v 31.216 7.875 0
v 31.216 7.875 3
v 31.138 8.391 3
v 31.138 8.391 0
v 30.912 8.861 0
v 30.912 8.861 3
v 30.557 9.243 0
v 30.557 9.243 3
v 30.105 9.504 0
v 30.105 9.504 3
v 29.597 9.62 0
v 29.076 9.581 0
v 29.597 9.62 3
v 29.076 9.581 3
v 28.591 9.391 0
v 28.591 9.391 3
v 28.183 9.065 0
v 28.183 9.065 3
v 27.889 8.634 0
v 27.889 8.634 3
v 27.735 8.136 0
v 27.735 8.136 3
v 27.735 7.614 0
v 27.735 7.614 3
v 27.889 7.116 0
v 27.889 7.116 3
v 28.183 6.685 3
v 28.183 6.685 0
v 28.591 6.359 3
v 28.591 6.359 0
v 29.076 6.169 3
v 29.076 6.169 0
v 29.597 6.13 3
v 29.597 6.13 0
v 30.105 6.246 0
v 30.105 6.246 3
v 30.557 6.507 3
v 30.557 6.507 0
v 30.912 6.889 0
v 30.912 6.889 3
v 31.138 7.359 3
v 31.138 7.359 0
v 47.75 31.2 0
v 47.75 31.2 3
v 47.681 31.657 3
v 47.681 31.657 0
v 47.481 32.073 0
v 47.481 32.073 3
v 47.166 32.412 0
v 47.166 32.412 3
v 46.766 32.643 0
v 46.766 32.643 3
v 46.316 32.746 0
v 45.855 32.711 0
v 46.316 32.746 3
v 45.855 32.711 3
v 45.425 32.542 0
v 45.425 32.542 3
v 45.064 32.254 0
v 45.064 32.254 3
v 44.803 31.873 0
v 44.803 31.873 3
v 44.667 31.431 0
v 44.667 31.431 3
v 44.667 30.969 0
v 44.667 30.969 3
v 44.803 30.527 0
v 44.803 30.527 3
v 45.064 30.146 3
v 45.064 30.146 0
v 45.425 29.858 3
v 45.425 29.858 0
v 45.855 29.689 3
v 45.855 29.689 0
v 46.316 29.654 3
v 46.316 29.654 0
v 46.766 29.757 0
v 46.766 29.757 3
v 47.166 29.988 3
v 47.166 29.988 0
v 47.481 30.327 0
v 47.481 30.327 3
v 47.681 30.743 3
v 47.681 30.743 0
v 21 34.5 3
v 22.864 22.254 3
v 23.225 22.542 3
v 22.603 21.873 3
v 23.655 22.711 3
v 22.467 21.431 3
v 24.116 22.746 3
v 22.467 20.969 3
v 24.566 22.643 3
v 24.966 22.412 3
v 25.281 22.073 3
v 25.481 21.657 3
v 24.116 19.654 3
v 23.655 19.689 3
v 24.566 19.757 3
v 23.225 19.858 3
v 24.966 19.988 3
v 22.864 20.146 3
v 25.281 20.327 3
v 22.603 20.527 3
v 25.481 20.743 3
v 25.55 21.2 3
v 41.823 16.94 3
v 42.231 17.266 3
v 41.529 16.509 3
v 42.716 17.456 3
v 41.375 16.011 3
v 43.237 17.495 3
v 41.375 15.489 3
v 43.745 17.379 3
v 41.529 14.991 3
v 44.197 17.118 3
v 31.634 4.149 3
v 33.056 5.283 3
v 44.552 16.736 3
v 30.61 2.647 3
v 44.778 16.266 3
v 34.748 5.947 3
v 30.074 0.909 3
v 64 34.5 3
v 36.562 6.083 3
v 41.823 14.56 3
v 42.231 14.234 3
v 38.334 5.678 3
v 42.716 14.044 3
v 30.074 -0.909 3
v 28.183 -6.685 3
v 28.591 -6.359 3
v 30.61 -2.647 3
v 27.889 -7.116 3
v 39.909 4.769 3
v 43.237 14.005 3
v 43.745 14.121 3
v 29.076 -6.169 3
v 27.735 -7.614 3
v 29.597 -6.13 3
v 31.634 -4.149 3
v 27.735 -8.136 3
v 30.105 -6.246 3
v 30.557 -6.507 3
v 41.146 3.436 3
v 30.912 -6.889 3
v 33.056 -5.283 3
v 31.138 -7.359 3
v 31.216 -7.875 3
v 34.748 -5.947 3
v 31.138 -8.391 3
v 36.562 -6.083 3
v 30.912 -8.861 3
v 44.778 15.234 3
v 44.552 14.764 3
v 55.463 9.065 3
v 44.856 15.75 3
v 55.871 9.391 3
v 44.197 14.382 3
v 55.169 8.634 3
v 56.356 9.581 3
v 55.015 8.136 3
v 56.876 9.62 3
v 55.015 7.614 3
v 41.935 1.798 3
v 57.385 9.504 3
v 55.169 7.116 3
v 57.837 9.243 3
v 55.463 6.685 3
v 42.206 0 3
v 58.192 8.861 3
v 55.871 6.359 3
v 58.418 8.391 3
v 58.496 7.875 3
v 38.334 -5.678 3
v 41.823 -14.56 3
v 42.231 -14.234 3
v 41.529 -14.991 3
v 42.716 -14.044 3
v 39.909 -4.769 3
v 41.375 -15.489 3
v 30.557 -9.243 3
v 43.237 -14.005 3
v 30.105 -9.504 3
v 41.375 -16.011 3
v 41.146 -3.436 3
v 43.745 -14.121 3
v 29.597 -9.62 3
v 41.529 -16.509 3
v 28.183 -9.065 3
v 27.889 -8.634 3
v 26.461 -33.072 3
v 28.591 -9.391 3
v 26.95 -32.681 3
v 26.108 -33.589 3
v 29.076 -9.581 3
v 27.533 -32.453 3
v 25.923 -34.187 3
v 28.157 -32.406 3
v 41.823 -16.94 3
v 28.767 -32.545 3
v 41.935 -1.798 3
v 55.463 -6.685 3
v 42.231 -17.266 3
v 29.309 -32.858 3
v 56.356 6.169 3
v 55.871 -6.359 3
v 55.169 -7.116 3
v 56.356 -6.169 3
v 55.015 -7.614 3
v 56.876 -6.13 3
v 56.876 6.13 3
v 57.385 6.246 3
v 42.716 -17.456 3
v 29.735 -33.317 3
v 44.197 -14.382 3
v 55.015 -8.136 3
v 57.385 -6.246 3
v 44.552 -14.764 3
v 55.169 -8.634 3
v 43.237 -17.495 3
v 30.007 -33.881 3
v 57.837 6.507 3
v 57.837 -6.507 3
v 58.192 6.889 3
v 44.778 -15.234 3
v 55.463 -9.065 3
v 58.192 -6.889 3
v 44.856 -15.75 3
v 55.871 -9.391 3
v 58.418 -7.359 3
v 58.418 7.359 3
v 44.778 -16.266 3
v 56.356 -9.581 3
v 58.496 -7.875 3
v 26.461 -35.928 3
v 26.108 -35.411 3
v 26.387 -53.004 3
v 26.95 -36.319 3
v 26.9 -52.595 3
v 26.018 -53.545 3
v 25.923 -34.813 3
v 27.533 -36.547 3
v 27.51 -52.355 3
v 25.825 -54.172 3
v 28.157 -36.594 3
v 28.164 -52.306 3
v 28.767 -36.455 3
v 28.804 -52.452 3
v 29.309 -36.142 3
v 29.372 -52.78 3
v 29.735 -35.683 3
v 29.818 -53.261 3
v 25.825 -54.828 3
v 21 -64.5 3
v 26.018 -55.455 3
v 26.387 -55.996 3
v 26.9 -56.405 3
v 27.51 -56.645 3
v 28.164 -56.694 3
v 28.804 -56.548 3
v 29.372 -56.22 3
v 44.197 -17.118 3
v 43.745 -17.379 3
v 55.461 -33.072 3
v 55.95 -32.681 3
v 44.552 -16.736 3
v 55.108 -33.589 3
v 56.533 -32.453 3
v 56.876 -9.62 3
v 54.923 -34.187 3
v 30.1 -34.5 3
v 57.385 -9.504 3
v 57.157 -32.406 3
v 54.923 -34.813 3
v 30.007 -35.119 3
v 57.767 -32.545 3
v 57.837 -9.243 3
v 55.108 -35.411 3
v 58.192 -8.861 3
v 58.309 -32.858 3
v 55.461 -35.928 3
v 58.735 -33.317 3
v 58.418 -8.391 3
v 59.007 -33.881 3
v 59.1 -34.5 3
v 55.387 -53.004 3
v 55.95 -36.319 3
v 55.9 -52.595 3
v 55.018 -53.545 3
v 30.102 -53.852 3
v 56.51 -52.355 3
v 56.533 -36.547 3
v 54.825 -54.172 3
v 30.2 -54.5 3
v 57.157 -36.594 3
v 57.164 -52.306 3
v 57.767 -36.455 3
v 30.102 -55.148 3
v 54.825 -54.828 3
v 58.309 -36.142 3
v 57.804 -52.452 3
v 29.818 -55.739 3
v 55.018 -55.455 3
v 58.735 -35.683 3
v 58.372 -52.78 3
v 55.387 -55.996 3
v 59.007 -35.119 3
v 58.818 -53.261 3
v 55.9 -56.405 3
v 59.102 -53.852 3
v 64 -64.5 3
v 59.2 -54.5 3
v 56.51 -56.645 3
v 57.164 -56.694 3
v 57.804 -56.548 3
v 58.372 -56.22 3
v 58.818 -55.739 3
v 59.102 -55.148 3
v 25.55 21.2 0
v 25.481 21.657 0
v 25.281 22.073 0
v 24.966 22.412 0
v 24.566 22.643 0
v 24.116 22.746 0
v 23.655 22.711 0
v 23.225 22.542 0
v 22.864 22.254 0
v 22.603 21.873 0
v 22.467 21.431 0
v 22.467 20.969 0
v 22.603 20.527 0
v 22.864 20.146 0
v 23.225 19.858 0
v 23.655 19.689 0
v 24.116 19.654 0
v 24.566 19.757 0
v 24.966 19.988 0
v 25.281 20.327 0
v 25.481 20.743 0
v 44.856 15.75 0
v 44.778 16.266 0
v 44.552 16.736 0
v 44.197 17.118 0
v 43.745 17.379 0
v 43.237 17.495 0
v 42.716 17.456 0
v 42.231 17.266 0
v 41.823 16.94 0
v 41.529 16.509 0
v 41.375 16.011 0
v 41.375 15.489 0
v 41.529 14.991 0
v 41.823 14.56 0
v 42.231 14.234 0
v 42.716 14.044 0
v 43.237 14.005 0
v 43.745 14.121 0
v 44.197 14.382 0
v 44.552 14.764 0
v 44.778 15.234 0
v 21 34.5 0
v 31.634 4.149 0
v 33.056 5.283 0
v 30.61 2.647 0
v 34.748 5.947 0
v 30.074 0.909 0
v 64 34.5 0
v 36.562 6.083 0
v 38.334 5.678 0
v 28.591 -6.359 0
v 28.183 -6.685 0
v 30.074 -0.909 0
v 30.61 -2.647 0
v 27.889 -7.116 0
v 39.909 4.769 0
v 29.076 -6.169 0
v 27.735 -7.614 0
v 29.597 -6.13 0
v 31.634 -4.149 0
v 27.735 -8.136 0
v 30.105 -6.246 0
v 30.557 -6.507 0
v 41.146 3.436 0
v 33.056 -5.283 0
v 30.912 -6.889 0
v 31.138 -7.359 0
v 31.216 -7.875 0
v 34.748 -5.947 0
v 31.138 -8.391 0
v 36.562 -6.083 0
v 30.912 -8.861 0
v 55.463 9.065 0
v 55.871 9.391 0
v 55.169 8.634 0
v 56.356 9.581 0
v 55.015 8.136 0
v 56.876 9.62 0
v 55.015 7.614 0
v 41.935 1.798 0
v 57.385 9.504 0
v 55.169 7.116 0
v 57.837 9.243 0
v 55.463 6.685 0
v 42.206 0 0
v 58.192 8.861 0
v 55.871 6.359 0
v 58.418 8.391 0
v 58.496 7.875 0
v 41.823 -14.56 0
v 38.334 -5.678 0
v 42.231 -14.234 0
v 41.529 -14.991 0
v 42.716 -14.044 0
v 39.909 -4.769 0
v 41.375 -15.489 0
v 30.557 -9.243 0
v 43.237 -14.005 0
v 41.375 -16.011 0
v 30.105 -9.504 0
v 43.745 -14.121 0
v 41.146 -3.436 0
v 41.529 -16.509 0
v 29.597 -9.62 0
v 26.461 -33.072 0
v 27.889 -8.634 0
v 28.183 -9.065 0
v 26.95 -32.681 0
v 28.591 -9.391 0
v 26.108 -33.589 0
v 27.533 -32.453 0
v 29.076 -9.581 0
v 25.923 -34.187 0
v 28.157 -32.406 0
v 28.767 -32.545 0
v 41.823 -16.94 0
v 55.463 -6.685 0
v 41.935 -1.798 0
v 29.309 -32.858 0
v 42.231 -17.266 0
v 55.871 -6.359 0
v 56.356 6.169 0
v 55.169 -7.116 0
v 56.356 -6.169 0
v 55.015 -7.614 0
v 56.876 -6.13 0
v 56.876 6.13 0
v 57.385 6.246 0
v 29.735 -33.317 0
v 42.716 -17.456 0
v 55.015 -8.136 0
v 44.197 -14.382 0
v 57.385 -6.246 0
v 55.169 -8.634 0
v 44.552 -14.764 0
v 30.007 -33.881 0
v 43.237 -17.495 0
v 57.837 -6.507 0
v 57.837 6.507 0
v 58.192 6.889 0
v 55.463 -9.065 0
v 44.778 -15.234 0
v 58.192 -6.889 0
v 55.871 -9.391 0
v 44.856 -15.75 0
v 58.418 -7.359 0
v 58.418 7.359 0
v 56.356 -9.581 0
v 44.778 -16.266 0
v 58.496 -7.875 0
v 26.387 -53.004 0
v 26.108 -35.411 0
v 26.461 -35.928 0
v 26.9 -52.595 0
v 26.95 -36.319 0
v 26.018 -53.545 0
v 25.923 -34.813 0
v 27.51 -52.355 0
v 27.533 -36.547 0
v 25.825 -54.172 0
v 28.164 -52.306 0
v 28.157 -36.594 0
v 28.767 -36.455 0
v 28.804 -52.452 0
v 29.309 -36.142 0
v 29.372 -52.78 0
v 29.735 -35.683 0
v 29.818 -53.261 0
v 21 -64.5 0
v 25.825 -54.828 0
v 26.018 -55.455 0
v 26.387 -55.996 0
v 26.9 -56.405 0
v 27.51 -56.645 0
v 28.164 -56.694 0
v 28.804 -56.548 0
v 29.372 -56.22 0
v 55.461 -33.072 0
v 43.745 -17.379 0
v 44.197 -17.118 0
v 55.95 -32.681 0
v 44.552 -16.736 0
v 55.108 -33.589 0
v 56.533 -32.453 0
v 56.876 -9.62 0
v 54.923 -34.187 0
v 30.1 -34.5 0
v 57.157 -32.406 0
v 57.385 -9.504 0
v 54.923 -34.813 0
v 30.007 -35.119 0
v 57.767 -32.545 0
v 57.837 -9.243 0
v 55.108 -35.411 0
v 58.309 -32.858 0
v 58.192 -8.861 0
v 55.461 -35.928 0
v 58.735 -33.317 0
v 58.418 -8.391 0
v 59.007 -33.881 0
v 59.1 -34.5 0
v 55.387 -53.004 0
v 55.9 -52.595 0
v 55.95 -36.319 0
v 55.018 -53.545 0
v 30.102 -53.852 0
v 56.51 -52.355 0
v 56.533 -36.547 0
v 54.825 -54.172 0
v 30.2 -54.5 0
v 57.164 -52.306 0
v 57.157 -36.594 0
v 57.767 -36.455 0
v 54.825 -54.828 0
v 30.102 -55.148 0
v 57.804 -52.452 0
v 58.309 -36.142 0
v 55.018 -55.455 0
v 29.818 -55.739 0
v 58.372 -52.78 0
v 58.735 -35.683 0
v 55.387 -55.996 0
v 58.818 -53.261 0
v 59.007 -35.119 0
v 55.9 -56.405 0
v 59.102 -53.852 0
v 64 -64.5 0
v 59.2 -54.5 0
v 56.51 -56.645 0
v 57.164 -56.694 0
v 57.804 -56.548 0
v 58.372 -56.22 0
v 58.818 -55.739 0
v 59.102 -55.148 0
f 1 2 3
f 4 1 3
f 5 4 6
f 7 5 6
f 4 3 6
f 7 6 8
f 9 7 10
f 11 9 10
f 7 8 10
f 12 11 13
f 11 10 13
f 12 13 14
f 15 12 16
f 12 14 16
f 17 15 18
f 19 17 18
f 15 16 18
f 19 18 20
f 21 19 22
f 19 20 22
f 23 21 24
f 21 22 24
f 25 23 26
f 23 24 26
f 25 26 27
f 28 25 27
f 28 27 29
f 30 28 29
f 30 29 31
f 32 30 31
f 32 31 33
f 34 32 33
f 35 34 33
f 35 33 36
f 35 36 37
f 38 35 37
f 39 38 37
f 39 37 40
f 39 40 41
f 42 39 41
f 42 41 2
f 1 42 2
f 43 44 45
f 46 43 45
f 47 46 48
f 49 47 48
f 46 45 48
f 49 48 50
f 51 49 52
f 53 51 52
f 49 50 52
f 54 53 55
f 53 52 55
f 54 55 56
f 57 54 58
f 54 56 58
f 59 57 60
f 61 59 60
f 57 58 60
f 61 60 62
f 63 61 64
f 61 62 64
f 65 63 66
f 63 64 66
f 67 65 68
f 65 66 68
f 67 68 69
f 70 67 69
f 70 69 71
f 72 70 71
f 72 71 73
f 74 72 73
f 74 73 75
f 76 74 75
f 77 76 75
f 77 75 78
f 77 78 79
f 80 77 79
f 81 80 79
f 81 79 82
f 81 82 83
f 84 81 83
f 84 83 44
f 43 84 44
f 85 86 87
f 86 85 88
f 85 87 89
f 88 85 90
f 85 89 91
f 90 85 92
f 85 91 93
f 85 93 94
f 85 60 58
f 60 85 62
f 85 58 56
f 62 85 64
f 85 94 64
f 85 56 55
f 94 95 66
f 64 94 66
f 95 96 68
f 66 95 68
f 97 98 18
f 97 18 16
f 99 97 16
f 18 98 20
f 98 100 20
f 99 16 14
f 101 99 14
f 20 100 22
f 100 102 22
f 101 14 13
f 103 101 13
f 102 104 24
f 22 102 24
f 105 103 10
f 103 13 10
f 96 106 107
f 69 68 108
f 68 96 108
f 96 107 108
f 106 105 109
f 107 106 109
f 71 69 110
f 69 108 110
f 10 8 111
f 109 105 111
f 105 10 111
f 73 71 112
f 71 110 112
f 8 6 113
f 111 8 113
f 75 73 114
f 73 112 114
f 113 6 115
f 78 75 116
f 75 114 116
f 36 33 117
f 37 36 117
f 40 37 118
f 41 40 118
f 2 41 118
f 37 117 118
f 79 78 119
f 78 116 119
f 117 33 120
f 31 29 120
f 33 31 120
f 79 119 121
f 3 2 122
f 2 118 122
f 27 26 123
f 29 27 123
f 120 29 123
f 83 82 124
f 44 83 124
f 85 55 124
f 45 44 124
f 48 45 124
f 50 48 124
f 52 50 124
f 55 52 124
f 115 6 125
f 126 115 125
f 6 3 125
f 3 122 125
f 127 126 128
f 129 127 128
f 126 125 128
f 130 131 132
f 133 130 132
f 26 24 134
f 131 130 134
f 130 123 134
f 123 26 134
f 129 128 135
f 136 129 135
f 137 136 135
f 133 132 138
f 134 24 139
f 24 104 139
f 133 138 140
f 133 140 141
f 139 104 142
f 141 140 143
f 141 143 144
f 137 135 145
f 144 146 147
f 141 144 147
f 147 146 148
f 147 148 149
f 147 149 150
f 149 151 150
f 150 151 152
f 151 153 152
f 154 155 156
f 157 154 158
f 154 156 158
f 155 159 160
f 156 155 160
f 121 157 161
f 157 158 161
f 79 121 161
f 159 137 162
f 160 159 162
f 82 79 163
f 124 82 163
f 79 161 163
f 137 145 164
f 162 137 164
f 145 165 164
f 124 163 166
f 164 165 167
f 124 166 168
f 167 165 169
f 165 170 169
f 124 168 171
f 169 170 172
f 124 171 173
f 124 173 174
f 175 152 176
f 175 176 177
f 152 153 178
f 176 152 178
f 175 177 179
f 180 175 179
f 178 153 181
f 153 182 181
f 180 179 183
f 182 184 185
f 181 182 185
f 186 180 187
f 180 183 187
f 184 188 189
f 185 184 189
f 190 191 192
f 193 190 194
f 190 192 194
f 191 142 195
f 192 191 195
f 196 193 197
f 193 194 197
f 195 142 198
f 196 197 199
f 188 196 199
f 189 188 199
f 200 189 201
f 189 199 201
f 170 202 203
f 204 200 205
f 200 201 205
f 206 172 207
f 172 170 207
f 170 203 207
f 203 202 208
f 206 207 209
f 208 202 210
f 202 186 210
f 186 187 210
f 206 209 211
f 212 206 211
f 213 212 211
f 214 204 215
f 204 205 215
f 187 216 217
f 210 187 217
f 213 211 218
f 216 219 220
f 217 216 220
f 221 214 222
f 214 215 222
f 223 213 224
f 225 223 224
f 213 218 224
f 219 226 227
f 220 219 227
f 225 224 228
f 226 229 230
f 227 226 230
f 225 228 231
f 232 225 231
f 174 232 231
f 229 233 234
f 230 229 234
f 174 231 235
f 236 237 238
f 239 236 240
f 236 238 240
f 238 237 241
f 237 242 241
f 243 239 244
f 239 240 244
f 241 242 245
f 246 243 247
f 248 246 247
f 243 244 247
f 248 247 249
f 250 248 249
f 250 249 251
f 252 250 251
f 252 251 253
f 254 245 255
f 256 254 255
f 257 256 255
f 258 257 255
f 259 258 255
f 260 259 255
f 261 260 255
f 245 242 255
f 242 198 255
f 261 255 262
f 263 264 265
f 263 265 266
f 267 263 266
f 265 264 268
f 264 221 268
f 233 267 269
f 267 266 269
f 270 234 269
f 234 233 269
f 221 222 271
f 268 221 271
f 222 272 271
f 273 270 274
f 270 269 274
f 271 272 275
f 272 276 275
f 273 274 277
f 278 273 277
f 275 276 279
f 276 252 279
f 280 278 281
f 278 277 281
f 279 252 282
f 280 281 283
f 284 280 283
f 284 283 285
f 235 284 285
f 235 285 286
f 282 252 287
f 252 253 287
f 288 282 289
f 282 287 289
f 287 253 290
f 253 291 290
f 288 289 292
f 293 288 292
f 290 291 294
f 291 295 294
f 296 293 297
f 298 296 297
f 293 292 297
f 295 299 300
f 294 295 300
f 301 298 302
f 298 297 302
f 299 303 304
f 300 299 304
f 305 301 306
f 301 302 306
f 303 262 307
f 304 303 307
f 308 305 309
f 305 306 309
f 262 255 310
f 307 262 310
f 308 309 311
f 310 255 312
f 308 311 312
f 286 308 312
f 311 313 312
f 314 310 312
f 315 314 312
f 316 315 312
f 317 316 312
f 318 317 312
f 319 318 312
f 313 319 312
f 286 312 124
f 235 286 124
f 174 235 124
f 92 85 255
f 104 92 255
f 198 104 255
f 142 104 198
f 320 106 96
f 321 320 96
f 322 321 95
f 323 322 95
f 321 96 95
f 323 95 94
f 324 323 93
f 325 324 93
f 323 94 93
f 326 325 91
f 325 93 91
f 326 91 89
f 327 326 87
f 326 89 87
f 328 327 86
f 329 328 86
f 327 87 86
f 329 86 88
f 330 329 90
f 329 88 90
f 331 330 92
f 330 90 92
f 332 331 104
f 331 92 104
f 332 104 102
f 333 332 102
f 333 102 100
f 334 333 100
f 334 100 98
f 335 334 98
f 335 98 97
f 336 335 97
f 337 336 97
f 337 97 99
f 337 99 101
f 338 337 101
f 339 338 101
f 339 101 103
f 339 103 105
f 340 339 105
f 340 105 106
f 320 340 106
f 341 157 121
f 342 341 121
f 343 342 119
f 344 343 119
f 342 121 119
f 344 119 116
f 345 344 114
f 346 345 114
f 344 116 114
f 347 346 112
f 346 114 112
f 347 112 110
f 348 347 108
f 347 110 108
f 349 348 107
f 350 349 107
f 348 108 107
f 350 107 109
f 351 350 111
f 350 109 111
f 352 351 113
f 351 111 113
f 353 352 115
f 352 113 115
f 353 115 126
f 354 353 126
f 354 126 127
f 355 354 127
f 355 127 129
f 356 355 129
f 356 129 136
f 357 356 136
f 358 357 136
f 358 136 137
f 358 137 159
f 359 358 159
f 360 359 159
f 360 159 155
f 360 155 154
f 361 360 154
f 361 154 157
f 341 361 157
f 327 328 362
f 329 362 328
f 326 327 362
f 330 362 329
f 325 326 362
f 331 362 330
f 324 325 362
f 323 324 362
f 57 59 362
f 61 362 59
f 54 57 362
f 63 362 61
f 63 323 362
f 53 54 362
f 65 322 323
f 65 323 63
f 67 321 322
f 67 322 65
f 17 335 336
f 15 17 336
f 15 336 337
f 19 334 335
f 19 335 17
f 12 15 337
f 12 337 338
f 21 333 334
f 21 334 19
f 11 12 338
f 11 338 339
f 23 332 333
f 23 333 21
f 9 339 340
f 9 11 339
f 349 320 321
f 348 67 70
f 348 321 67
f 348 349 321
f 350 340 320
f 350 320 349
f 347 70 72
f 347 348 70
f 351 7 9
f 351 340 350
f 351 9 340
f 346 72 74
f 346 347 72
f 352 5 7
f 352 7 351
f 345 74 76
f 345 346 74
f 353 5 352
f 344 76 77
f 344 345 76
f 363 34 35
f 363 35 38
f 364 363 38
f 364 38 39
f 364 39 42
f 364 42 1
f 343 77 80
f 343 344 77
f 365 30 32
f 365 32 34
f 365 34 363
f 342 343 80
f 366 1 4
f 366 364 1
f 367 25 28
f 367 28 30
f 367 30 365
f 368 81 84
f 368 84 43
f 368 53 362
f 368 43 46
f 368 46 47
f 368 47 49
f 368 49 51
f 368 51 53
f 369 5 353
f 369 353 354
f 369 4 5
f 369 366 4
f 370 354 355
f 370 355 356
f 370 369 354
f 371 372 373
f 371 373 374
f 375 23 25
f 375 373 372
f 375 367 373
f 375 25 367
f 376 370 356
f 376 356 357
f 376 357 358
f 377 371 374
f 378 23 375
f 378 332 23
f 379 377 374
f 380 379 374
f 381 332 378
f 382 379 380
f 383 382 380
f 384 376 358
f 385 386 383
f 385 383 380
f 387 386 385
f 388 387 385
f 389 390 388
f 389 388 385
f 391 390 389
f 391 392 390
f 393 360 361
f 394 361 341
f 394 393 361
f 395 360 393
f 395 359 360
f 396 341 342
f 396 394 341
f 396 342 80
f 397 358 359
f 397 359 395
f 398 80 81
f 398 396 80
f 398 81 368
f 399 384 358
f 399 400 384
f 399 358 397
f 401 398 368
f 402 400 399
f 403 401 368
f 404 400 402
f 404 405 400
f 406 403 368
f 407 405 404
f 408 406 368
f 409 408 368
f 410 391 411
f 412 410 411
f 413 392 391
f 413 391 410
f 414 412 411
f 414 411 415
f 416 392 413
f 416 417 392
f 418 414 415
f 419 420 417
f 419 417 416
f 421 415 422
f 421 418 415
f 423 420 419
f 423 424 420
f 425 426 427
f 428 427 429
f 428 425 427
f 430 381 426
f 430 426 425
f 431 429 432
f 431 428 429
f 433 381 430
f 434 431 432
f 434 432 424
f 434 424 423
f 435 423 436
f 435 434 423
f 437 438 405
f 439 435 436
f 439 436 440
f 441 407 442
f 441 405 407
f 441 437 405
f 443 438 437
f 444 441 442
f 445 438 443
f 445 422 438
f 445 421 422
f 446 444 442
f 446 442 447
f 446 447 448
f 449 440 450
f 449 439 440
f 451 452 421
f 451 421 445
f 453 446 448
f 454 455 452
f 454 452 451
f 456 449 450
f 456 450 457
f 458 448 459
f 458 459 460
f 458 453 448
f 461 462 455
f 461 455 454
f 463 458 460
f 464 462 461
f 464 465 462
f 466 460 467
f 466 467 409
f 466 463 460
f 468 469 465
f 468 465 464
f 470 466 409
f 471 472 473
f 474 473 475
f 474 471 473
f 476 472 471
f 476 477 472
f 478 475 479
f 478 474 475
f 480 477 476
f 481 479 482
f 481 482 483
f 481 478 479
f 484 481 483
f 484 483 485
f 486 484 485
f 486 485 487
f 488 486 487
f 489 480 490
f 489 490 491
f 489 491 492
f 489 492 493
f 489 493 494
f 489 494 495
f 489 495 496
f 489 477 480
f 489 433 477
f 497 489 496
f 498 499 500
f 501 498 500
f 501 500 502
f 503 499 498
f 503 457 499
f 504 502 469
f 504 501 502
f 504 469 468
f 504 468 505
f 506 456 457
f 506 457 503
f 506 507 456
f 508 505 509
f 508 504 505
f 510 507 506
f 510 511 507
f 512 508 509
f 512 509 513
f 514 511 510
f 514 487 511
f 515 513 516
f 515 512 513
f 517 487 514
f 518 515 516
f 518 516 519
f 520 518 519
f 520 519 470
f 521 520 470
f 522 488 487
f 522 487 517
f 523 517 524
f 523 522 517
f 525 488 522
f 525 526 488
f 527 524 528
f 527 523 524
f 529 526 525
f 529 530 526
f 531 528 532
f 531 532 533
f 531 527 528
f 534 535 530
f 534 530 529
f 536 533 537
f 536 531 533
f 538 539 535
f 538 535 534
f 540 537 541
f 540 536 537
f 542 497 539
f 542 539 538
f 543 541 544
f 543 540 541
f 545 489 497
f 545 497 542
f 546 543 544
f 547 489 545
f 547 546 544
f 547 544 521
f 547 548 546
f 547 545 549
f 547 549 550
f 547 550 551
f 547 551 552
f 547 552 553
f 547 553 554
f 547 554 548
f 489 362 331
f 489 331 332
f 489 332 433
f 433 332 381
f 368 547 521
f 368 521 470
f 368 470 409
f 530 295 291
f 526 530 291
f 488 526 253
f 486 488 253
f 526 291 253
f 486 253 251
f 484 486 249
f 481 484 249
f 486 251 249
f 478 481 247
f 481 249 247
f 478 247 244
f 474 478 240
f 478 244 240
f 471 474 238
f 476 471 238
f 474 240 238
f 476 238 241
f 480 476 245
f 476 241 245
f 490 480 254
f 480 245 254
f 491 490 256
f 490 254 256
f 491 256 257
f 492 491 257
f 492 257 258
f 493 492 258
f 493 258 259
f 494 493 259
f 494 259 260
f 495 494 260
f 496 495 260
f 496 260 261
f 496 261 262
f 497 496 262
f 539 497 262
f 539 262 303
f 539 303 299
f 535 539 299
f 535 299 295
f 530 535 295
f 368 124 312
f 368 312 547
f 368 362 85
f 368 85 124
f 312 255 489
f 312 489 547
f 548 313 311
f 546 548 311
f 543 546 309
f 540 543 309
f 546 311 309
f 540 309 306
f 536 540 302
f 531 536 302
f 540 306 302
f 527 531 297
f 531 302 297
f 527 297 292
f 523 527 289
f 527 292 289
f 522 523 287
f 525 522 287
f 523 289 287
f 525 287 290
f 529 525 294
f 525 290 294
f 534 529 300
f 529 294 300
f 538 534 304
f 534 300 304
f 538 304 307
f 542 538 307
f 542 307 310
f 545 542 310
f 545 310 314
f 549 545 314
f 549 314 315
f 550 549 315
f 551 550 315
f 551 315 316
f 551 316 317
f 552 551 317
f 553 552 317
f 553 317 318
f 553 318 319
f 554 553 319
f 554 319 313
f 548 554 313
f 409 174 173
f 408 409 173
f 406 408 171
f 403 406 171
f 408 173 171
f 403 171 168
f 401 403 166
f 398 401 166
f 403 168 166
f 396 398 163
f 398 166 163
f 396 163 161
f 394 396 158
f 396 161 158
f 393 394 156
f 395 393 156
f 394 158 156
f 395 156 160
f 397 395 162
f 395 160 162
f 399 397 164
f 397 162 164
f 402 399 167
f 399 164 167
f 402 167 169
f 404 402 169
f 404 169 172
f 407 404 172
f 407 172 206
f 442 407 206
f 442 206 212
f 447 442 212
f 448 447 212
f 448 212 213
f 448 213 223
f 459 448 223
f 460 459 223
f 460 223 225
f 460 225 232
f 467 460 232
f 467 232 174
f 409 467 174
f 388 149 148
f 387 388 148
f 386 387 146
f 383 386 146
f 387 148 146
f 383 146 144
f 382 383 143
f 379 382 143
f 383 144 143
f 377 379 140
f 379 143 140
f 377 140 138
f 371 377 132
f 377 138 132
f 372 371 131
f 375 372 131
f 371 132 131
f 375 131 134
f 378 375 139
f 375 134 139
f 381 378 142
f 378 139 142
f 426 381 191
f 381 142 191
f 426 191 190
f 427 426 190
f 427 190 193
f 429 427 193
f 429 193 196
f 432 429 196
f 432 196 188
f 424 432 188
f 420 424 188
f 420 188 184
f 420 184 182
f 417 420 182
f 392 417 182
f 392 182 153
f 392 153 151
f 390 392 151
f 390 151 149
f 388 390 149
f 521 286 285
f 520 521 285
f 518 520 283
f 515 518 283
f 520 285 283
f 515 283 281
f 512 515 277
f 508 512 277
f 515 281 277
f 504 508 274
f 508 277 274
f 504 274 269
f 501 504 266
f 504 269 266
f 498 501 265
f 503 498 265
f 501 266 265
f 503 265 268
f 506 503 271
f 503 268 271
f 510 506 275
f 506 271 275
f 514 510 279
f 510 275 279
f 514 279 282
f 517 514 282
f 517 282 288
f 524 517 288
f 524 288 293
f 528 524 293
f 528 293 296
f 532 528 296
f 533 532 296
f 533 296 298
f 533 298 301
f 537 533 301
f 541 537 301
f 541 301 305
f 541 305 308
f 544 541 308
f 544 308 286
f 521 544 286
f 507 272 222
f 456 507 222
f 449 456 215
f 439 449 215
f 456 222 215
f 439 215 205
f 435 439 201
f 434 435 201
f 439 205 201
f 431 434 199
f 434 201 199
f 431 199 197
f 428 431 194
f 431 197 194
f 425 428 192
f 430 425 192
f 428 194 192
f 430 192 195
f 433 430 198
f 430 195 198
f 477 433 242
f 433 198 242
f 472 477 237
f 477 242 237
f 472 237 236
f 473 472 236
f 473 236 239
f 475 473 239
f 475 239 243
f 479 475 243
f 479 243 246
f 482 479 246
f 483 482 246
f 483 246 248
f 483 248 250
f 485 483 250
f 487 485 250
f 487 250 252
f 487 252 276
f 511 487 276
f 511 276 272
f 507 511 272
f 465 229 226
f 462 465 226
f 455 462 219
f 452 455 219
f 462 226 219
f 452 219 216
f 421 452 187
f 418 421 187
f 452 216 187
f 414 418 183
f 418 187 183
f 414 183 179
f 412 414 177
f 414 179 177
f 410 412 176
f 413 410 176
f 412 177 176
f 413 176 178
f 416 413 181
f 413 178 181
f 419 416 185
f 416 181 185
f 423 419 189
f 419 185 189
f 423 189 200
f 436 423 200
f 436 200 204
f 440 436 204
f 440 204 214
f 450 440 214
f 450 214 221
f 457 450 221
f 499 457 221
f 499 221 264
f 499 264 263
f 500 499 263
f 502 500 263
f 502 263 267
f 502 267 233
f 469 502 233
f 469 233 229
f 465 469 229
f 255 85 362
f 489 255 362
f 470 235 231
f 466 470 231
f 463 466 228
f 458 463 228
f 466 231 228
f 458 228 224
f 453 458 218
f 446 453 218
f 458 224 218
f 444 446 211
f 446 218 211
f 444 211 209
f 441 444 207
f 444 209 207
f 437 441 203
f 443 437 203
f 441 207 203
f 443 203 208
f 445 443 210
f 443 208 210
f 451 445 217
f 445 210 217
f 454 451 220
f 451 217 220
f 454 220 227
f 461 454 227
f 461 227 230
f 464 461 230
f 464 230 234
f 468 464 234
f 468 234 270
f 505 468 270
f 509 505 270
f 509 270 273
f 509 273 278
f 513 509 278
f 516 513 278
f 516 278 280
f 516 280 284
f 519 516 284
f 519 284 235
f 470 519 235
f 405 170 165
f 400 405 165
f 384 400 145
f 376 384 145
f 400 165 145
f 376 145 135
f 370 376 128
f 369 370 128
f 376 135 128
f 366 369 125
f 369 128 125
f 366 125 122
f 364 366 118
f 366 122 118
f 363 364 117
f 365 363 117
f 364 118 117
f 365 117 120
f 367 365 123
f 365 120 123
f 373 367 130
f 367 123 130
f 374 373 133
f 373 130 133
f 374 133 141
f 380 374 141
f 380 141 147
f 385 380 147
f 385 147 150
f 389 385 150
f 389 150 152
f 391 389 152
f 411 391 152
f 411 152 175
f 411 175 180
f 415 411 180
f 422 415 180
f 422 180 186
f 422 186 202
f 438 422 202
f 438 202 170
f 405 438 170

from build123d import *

# Parameters (mm, degrees)
SKETCH_1_W          = 40
SKETCH_1_H          = 29
EXTRUDE_1_DEPTH     = 3
CUT_EXTRUDE_1_DEPTH = 3
SKETCH_3_W          = 40
SKETCH_3_H          = 3
EXTRUDE_2_DEPTH     = 10
SKETCH_4_W          = 40
SKETCH_4_H          = 3
EXTRUDE_3_DEPTH     = 10
SKETCH_6_W          = 3
SKETCH_6_H          = 49
EXTRUDE_5_DEPTH     = 42
SKETCH_8_W          = 3
SKETCH_8_H          = 49
EXTRUDE_6_DEPTH     = 2
SKETCH_9_W          = 3
SKETCH_9_H          = 49
EXTRUDE_7_DEPTH     = 2
SKETCH_10_W         = 86
SKETCH_10_H         = 3
EXTRUDE_8_DEPTH     = 10
SKETCH_11_W         = 86
SKETCH_11_H         = 3
EXTRUDE_9_DEPTH     = 10
SKETCH_7_R          = 1.75
SKETCH_7_R_2        = 6.1
CUT_EXTRUDE_4_DEPTH = 10
SKETCH_14_W         = 3
SKETCH_14_H         = 69
CUT_EXTRUDE_5_DEPTH = 43
SKETCH_17_W         = 43
SKETCH_17_H         = 3
EXTRUDE_10_DEPTH    = 20
SKETCH_18_R         = 2.1
CUT_EXTRUDE_6_DEPTH = 10
SKETCH_20_W         = 43
SKETCH_20_H         = 3
EXTRUDE_11_DEPTH    = 10
SKETCH_21_W         = 43
SKETCH_21_H         = 3
CUT_EXTRUDE_7_DEPTH = 10
SKETCH_22_R         = 2.2
CUT_EXTRUDE_8_DEPTH = 10
SKETCH_24_W         = 43
SKETCH_24_H         = 3
EXTRUDE_12_DEPTH    = 10
SKETCH_25_R         = 1.55
CUT_EXTRUDE_9_DEPTH = 10


with BuildPart() as part:
    # ｽｹｯﾁ1 → ﾎﾞｽ - 押し出し1 (new body)
    with BuildSketch(Plane.XY):
        Rectangle(SKETCH_1_W, SKETCH_1_H)
    extrude(amount=EXTRUDE_1_DEPTH)

    # ｽｹｯﾁ2 → ｶｯﾄ - 押し出し1 (cut)
    with BuildSketch(Plane.XY.offset(3)):
        with BuildLine():
            ThreePointArc((-14.4, 10.5), (-15.01507576, 11.98492424), (-16.5, 12.6))
            Line((-16.5, 12.6), (-16.5, 10.5))
            Line((-16.5, 10.5), (-18.6, 10.5))
            ThreePointArc((-18.6, 10.5), (-16.5, 8.4), (-14.4, 10.5))
        make_face()
        with BuildLine():
            Line((-16.5, 10.5), (-16.5, 12.6))
            ThreePointArc((-16.5, 12.6), (-17.98492424, 11.98492424), (-18.6, 10.5))
            Line((-18.6, 10.5), (-16.5, 10.5))
        make_face()
        with BuildLine():
            ThreePointArc((-18.6, -10.5), (-17.98492424, -11.98492424), (-16.5, -12.6))
            Line((-16.5, -12.6), (-16.5, -10.5))
            Line((-16.5, -10.5), (-18.6, -10.5))
        make_face()
        with BuildLine():
            Line((-16.5, -10.5), (-16.5, -12.6))
            ThreePointArc((-16.5, -12.6), (-15.01507576, -11.98492424), (-14.4, -10.5))
            ThreePointArc((-14.4, -10.5), (-16.5, -8.4), (-18.6, -10.5))
            Line((-18.6, -10.5), (-16.5, -10.5))
        make_face()
        with BuildLine():
            ThreePointArc((18.6, -10.5), (15.01507576, -9.01507576), (16.5, -12.6))
            Line((16.5, -12.6), (16.5, -10.5))
            Line((16.5, -10.5), (18.6, -10.5))
        make_face()
        with BuildLine():
            Line((16.5, -10.5), (16.5, -12.6))
            ThreePointArc((16.5, -12.6), (17.98492424, -11.98492424), (18.6, -10.5))
            Line((18.6, -10.5), (16.5, -10.5))
        make_face()
        with BuildLine():
            ThreePointArc((18.6, 10.5), (17.98492424, 11.98492424), (16.5, 12.6))
            Line((16.5, 12.6), (16.5, 10.5))
            Line((16.5, 10.5), (18.6, 10.5))
        make_face()
        with BuildLine():
            Line((16.5, 10.5), (16.5, 12.6))
            ThreePointArc((16.5, 12.6), (15.01507576, 9.01507576), (18.6, 10.5))
            Line((18.6, 10.5), (16.5, 10.5))
        make_face()
    extrude(amount=-CUT_EXTRUDE_1_DEPTH, mode=Mode.SUBTRACT)

    # ｽｹｯﾁ3 → ﾎﾞｽ - 押し出し2 (add)
    with BuildSketch(Plane.XZ.offset(14.5)):
        with Locations((0, 1.5)):
            Rectangle(SKETCH_3_W, SKETCH_3_H)
    extrude(amount=EXTRUDE_2_DEPTH)

    # ｽｹｯﾁ4 → ﾎﾞｽ - 押し出し3 (add)
    with BuildSketch(Plane(origin=(0, 14.5, 0), x_dir=(1, 0, 0), z_dir=(0, 1, 0))):
        with Locations((0, -1.5)):
            Rectangle(SKETCH_4_W, SKETCH_4_H)
    extrude(amount=EXTRUDE_3_DEPTH)

    # ｽｹｯﾁ6 → ﾎﾞｽ - 押し出し5 (add)
    with BuildSketch(Plane(origin=(20, 0, 0), x_dir=(0, 0, -1), z_dir=(1, 0, 0))):
        with Locations((-1.5, 0)):
            Rectangle(SKETCH_6_W, SKETCH_6_H)
    extrude(amount=EXTRUDE_5_DEPTH)

    # ｽｹｯﾁ8 → ﾎﾞｽ - 押し出し6 (add)
    with BuildSketch(Plane.ZY.offset(20)):
        with Locations((1.5, 0)):
            Rectangle(SKETCH_8_W, SKETCH_8_H)
    extrude(amount=EXTRUDE_6_DEPTH)

    # ｽｹｯﾁ9 → ﾎﾞｽ - 押し出し7 (add)
    with BuildSketch(Plane(origin=(62, 0, 0), x_dir=(0, 0, -1), z_dir=(1, 0, 0))):
        with Locations((-1.5, 0)):
            Rectangle(SKETCH_9_W, SKETCH_9_H)
    extrude(amount=EXTRUDE_7_DEPTH)

    # ｽｹｯﾁ10 → ﾎﾞｽ - 押し出し8 (add)
    with BuildSketch(Plane.XZ.offset(24.5)):
        with Locations((21, 1.5)):
            Rectangle(SKETCH_10_W, SKETCH_10_H)
    extrude(amount=EXTRUDE_8_DEPTH)

    # ｽｹｯﾁ11 → ﾎﾞｽ - 押し出し9 (add)
    with BuildSketch(Plane(origin=(0, 24.5, 0), x_dir=(1, 0, 0), z_dir=(0, 1, 0))):
        with Locations((21, -1.5)):
            Rectangle(SKETCH_11_W, SKETCH_11_H)
    extrude(amount=EXTRUDE_9_DEPTH)

    # ｽｹｯﾁ7 → ｶｯﾄ - 押し出し4 (cut)
    with BuildSketch(Plane.XY.offset(3)):
        with Locations((56.745697969, 7.875)):
            Circle(SKETCH_7_R)
        with Locations((56.745697969, -7.875)):
            Circle(SKETCH_7_R)
        with Locations((36.10579786, 0)):
            Circle(SKETCH_7_R_2)
        with Locations((43.10579786, 15.75)):
            Circle(SKETCH_7_R)
        with Locations((43.10579786, -15.75)):
            Circle(SKETCH_7_R)
        with Locations((29.46589775, 7.875)):
            Circle(SKETCH_7_R)
        with Locations((29.46589775, -7.875)):
            Circle(SKETCH_7_R)
    extrude(amount=-CUT_EXTRUDE_4_DEPTH, mode=Mode.SUBTRACT)

    # ｽｹｯﾁ14 → ｶｯﾄ - 押し出し5 (cut)
    with BuildSketch(Plane.ZY.offset(22)):
        with Locations((1.5, 0)):
            Rectangle(SKETCH_14_W, SKETCH_14_H)
    extrude(amount=-CUT_EXTRUDE_5_DEPTH, mode=Mode.SUBTRACT)

    # ｽｹｯﾁ17 → ﾎﾞｽ - 押し出し10 (add)
    with BuildSketch(Plane.XZ.offset(34.5)):
        with Locations((42.5, 1.5)):
            Rectangle(SKETCH_17_W, SKETCH_17_H)
    extrude(amount=EXTRUDE_10_DEPTH)

    # ｽｹｯﾁ18 → ｶｯﾄ - 押し出し6 (cut)
    with BuildSketch(Plane.XY.offset(3)):
        with Locations((28, -34.5)):
            Circle(SKETCH_18_R)
        with Locations((57, -34.5)):
            Circle(SKETCH_18_R)
    extrude(amount=-CUT_EXTRUDE_6_DEPTH, mode=Mode.SUBTRACT)

    # ｽｹｯﾁ20 → ﾎﾞｽ - 押し出し11 (add)
    with BuildSketch(Plane.XZ.offset(54.5)):
        with Locations((42.5, 1.5)):
            Rectangle(SKETCH_20_W, SKETCH_20_H)
    extrude(amount=EXTRUDE_11_DEPTH)

    # ｽｹｯﾁ21 → ｶｯﾄ - 押し出し7 (cut)
    with BuildSketch(Plane(origin=(0, 34.5, 0), x_dir=(1, 0, 0), z_dir=(0, 1, 0))):
        with Locations((42.5, -1.5)):
            Rectangle(SKETCH_21_W, SKETCH_21_H)
    extrude(amount=-CUT_EXTRUDE_7_DEPTH, mode=Mode.SUBTRACT)

    # ｽｹｯﾁ22 → ｶｯﾄ - 押し出し8 (cut)
    with BuildSketch(Plane.XY.offset(3)):
        with Locations((28, -54.5)):
            Circle(SKETCH_22_R)
        with Locations((57, -54.5)):
            Circle(SKETCH_22_R)
    extrude(amount=-CUT_EXTRUDE_8_DEPTH, mode=Mode.SUBTRACT)

    # ｽｹｯﾁ24 → ﾎﾞｽ - 押し出し12 (add)
    with BuildSketch(Plane(origin=(0, 24.5, 0), x_dir=(1, 0, 0), z_dir=(0, 1, 0))):
        with Locations((42.5, -1.5)):
            Rectangle(SKETCH_24_W, SKETCH_24_H)
    extrude(amount=EXTRUDE_12_DEPTH)

    # ｽｹｯﾁ25 → ｶｯﾄ - 押し出し9 (cut)
    with BuildSketch(Plane.XY.offset(3)):
        with Locations((24, 21.2)):
            Circle(SKETCH_25_R)
        with Locations((46.2, 31.2)):
            Circle(SKETCH_25_R)
    extrude(amount=-CUT_EXTRUDE_9_DEPTH, mode=Mode.SUBTRACT)


solid = part.part
